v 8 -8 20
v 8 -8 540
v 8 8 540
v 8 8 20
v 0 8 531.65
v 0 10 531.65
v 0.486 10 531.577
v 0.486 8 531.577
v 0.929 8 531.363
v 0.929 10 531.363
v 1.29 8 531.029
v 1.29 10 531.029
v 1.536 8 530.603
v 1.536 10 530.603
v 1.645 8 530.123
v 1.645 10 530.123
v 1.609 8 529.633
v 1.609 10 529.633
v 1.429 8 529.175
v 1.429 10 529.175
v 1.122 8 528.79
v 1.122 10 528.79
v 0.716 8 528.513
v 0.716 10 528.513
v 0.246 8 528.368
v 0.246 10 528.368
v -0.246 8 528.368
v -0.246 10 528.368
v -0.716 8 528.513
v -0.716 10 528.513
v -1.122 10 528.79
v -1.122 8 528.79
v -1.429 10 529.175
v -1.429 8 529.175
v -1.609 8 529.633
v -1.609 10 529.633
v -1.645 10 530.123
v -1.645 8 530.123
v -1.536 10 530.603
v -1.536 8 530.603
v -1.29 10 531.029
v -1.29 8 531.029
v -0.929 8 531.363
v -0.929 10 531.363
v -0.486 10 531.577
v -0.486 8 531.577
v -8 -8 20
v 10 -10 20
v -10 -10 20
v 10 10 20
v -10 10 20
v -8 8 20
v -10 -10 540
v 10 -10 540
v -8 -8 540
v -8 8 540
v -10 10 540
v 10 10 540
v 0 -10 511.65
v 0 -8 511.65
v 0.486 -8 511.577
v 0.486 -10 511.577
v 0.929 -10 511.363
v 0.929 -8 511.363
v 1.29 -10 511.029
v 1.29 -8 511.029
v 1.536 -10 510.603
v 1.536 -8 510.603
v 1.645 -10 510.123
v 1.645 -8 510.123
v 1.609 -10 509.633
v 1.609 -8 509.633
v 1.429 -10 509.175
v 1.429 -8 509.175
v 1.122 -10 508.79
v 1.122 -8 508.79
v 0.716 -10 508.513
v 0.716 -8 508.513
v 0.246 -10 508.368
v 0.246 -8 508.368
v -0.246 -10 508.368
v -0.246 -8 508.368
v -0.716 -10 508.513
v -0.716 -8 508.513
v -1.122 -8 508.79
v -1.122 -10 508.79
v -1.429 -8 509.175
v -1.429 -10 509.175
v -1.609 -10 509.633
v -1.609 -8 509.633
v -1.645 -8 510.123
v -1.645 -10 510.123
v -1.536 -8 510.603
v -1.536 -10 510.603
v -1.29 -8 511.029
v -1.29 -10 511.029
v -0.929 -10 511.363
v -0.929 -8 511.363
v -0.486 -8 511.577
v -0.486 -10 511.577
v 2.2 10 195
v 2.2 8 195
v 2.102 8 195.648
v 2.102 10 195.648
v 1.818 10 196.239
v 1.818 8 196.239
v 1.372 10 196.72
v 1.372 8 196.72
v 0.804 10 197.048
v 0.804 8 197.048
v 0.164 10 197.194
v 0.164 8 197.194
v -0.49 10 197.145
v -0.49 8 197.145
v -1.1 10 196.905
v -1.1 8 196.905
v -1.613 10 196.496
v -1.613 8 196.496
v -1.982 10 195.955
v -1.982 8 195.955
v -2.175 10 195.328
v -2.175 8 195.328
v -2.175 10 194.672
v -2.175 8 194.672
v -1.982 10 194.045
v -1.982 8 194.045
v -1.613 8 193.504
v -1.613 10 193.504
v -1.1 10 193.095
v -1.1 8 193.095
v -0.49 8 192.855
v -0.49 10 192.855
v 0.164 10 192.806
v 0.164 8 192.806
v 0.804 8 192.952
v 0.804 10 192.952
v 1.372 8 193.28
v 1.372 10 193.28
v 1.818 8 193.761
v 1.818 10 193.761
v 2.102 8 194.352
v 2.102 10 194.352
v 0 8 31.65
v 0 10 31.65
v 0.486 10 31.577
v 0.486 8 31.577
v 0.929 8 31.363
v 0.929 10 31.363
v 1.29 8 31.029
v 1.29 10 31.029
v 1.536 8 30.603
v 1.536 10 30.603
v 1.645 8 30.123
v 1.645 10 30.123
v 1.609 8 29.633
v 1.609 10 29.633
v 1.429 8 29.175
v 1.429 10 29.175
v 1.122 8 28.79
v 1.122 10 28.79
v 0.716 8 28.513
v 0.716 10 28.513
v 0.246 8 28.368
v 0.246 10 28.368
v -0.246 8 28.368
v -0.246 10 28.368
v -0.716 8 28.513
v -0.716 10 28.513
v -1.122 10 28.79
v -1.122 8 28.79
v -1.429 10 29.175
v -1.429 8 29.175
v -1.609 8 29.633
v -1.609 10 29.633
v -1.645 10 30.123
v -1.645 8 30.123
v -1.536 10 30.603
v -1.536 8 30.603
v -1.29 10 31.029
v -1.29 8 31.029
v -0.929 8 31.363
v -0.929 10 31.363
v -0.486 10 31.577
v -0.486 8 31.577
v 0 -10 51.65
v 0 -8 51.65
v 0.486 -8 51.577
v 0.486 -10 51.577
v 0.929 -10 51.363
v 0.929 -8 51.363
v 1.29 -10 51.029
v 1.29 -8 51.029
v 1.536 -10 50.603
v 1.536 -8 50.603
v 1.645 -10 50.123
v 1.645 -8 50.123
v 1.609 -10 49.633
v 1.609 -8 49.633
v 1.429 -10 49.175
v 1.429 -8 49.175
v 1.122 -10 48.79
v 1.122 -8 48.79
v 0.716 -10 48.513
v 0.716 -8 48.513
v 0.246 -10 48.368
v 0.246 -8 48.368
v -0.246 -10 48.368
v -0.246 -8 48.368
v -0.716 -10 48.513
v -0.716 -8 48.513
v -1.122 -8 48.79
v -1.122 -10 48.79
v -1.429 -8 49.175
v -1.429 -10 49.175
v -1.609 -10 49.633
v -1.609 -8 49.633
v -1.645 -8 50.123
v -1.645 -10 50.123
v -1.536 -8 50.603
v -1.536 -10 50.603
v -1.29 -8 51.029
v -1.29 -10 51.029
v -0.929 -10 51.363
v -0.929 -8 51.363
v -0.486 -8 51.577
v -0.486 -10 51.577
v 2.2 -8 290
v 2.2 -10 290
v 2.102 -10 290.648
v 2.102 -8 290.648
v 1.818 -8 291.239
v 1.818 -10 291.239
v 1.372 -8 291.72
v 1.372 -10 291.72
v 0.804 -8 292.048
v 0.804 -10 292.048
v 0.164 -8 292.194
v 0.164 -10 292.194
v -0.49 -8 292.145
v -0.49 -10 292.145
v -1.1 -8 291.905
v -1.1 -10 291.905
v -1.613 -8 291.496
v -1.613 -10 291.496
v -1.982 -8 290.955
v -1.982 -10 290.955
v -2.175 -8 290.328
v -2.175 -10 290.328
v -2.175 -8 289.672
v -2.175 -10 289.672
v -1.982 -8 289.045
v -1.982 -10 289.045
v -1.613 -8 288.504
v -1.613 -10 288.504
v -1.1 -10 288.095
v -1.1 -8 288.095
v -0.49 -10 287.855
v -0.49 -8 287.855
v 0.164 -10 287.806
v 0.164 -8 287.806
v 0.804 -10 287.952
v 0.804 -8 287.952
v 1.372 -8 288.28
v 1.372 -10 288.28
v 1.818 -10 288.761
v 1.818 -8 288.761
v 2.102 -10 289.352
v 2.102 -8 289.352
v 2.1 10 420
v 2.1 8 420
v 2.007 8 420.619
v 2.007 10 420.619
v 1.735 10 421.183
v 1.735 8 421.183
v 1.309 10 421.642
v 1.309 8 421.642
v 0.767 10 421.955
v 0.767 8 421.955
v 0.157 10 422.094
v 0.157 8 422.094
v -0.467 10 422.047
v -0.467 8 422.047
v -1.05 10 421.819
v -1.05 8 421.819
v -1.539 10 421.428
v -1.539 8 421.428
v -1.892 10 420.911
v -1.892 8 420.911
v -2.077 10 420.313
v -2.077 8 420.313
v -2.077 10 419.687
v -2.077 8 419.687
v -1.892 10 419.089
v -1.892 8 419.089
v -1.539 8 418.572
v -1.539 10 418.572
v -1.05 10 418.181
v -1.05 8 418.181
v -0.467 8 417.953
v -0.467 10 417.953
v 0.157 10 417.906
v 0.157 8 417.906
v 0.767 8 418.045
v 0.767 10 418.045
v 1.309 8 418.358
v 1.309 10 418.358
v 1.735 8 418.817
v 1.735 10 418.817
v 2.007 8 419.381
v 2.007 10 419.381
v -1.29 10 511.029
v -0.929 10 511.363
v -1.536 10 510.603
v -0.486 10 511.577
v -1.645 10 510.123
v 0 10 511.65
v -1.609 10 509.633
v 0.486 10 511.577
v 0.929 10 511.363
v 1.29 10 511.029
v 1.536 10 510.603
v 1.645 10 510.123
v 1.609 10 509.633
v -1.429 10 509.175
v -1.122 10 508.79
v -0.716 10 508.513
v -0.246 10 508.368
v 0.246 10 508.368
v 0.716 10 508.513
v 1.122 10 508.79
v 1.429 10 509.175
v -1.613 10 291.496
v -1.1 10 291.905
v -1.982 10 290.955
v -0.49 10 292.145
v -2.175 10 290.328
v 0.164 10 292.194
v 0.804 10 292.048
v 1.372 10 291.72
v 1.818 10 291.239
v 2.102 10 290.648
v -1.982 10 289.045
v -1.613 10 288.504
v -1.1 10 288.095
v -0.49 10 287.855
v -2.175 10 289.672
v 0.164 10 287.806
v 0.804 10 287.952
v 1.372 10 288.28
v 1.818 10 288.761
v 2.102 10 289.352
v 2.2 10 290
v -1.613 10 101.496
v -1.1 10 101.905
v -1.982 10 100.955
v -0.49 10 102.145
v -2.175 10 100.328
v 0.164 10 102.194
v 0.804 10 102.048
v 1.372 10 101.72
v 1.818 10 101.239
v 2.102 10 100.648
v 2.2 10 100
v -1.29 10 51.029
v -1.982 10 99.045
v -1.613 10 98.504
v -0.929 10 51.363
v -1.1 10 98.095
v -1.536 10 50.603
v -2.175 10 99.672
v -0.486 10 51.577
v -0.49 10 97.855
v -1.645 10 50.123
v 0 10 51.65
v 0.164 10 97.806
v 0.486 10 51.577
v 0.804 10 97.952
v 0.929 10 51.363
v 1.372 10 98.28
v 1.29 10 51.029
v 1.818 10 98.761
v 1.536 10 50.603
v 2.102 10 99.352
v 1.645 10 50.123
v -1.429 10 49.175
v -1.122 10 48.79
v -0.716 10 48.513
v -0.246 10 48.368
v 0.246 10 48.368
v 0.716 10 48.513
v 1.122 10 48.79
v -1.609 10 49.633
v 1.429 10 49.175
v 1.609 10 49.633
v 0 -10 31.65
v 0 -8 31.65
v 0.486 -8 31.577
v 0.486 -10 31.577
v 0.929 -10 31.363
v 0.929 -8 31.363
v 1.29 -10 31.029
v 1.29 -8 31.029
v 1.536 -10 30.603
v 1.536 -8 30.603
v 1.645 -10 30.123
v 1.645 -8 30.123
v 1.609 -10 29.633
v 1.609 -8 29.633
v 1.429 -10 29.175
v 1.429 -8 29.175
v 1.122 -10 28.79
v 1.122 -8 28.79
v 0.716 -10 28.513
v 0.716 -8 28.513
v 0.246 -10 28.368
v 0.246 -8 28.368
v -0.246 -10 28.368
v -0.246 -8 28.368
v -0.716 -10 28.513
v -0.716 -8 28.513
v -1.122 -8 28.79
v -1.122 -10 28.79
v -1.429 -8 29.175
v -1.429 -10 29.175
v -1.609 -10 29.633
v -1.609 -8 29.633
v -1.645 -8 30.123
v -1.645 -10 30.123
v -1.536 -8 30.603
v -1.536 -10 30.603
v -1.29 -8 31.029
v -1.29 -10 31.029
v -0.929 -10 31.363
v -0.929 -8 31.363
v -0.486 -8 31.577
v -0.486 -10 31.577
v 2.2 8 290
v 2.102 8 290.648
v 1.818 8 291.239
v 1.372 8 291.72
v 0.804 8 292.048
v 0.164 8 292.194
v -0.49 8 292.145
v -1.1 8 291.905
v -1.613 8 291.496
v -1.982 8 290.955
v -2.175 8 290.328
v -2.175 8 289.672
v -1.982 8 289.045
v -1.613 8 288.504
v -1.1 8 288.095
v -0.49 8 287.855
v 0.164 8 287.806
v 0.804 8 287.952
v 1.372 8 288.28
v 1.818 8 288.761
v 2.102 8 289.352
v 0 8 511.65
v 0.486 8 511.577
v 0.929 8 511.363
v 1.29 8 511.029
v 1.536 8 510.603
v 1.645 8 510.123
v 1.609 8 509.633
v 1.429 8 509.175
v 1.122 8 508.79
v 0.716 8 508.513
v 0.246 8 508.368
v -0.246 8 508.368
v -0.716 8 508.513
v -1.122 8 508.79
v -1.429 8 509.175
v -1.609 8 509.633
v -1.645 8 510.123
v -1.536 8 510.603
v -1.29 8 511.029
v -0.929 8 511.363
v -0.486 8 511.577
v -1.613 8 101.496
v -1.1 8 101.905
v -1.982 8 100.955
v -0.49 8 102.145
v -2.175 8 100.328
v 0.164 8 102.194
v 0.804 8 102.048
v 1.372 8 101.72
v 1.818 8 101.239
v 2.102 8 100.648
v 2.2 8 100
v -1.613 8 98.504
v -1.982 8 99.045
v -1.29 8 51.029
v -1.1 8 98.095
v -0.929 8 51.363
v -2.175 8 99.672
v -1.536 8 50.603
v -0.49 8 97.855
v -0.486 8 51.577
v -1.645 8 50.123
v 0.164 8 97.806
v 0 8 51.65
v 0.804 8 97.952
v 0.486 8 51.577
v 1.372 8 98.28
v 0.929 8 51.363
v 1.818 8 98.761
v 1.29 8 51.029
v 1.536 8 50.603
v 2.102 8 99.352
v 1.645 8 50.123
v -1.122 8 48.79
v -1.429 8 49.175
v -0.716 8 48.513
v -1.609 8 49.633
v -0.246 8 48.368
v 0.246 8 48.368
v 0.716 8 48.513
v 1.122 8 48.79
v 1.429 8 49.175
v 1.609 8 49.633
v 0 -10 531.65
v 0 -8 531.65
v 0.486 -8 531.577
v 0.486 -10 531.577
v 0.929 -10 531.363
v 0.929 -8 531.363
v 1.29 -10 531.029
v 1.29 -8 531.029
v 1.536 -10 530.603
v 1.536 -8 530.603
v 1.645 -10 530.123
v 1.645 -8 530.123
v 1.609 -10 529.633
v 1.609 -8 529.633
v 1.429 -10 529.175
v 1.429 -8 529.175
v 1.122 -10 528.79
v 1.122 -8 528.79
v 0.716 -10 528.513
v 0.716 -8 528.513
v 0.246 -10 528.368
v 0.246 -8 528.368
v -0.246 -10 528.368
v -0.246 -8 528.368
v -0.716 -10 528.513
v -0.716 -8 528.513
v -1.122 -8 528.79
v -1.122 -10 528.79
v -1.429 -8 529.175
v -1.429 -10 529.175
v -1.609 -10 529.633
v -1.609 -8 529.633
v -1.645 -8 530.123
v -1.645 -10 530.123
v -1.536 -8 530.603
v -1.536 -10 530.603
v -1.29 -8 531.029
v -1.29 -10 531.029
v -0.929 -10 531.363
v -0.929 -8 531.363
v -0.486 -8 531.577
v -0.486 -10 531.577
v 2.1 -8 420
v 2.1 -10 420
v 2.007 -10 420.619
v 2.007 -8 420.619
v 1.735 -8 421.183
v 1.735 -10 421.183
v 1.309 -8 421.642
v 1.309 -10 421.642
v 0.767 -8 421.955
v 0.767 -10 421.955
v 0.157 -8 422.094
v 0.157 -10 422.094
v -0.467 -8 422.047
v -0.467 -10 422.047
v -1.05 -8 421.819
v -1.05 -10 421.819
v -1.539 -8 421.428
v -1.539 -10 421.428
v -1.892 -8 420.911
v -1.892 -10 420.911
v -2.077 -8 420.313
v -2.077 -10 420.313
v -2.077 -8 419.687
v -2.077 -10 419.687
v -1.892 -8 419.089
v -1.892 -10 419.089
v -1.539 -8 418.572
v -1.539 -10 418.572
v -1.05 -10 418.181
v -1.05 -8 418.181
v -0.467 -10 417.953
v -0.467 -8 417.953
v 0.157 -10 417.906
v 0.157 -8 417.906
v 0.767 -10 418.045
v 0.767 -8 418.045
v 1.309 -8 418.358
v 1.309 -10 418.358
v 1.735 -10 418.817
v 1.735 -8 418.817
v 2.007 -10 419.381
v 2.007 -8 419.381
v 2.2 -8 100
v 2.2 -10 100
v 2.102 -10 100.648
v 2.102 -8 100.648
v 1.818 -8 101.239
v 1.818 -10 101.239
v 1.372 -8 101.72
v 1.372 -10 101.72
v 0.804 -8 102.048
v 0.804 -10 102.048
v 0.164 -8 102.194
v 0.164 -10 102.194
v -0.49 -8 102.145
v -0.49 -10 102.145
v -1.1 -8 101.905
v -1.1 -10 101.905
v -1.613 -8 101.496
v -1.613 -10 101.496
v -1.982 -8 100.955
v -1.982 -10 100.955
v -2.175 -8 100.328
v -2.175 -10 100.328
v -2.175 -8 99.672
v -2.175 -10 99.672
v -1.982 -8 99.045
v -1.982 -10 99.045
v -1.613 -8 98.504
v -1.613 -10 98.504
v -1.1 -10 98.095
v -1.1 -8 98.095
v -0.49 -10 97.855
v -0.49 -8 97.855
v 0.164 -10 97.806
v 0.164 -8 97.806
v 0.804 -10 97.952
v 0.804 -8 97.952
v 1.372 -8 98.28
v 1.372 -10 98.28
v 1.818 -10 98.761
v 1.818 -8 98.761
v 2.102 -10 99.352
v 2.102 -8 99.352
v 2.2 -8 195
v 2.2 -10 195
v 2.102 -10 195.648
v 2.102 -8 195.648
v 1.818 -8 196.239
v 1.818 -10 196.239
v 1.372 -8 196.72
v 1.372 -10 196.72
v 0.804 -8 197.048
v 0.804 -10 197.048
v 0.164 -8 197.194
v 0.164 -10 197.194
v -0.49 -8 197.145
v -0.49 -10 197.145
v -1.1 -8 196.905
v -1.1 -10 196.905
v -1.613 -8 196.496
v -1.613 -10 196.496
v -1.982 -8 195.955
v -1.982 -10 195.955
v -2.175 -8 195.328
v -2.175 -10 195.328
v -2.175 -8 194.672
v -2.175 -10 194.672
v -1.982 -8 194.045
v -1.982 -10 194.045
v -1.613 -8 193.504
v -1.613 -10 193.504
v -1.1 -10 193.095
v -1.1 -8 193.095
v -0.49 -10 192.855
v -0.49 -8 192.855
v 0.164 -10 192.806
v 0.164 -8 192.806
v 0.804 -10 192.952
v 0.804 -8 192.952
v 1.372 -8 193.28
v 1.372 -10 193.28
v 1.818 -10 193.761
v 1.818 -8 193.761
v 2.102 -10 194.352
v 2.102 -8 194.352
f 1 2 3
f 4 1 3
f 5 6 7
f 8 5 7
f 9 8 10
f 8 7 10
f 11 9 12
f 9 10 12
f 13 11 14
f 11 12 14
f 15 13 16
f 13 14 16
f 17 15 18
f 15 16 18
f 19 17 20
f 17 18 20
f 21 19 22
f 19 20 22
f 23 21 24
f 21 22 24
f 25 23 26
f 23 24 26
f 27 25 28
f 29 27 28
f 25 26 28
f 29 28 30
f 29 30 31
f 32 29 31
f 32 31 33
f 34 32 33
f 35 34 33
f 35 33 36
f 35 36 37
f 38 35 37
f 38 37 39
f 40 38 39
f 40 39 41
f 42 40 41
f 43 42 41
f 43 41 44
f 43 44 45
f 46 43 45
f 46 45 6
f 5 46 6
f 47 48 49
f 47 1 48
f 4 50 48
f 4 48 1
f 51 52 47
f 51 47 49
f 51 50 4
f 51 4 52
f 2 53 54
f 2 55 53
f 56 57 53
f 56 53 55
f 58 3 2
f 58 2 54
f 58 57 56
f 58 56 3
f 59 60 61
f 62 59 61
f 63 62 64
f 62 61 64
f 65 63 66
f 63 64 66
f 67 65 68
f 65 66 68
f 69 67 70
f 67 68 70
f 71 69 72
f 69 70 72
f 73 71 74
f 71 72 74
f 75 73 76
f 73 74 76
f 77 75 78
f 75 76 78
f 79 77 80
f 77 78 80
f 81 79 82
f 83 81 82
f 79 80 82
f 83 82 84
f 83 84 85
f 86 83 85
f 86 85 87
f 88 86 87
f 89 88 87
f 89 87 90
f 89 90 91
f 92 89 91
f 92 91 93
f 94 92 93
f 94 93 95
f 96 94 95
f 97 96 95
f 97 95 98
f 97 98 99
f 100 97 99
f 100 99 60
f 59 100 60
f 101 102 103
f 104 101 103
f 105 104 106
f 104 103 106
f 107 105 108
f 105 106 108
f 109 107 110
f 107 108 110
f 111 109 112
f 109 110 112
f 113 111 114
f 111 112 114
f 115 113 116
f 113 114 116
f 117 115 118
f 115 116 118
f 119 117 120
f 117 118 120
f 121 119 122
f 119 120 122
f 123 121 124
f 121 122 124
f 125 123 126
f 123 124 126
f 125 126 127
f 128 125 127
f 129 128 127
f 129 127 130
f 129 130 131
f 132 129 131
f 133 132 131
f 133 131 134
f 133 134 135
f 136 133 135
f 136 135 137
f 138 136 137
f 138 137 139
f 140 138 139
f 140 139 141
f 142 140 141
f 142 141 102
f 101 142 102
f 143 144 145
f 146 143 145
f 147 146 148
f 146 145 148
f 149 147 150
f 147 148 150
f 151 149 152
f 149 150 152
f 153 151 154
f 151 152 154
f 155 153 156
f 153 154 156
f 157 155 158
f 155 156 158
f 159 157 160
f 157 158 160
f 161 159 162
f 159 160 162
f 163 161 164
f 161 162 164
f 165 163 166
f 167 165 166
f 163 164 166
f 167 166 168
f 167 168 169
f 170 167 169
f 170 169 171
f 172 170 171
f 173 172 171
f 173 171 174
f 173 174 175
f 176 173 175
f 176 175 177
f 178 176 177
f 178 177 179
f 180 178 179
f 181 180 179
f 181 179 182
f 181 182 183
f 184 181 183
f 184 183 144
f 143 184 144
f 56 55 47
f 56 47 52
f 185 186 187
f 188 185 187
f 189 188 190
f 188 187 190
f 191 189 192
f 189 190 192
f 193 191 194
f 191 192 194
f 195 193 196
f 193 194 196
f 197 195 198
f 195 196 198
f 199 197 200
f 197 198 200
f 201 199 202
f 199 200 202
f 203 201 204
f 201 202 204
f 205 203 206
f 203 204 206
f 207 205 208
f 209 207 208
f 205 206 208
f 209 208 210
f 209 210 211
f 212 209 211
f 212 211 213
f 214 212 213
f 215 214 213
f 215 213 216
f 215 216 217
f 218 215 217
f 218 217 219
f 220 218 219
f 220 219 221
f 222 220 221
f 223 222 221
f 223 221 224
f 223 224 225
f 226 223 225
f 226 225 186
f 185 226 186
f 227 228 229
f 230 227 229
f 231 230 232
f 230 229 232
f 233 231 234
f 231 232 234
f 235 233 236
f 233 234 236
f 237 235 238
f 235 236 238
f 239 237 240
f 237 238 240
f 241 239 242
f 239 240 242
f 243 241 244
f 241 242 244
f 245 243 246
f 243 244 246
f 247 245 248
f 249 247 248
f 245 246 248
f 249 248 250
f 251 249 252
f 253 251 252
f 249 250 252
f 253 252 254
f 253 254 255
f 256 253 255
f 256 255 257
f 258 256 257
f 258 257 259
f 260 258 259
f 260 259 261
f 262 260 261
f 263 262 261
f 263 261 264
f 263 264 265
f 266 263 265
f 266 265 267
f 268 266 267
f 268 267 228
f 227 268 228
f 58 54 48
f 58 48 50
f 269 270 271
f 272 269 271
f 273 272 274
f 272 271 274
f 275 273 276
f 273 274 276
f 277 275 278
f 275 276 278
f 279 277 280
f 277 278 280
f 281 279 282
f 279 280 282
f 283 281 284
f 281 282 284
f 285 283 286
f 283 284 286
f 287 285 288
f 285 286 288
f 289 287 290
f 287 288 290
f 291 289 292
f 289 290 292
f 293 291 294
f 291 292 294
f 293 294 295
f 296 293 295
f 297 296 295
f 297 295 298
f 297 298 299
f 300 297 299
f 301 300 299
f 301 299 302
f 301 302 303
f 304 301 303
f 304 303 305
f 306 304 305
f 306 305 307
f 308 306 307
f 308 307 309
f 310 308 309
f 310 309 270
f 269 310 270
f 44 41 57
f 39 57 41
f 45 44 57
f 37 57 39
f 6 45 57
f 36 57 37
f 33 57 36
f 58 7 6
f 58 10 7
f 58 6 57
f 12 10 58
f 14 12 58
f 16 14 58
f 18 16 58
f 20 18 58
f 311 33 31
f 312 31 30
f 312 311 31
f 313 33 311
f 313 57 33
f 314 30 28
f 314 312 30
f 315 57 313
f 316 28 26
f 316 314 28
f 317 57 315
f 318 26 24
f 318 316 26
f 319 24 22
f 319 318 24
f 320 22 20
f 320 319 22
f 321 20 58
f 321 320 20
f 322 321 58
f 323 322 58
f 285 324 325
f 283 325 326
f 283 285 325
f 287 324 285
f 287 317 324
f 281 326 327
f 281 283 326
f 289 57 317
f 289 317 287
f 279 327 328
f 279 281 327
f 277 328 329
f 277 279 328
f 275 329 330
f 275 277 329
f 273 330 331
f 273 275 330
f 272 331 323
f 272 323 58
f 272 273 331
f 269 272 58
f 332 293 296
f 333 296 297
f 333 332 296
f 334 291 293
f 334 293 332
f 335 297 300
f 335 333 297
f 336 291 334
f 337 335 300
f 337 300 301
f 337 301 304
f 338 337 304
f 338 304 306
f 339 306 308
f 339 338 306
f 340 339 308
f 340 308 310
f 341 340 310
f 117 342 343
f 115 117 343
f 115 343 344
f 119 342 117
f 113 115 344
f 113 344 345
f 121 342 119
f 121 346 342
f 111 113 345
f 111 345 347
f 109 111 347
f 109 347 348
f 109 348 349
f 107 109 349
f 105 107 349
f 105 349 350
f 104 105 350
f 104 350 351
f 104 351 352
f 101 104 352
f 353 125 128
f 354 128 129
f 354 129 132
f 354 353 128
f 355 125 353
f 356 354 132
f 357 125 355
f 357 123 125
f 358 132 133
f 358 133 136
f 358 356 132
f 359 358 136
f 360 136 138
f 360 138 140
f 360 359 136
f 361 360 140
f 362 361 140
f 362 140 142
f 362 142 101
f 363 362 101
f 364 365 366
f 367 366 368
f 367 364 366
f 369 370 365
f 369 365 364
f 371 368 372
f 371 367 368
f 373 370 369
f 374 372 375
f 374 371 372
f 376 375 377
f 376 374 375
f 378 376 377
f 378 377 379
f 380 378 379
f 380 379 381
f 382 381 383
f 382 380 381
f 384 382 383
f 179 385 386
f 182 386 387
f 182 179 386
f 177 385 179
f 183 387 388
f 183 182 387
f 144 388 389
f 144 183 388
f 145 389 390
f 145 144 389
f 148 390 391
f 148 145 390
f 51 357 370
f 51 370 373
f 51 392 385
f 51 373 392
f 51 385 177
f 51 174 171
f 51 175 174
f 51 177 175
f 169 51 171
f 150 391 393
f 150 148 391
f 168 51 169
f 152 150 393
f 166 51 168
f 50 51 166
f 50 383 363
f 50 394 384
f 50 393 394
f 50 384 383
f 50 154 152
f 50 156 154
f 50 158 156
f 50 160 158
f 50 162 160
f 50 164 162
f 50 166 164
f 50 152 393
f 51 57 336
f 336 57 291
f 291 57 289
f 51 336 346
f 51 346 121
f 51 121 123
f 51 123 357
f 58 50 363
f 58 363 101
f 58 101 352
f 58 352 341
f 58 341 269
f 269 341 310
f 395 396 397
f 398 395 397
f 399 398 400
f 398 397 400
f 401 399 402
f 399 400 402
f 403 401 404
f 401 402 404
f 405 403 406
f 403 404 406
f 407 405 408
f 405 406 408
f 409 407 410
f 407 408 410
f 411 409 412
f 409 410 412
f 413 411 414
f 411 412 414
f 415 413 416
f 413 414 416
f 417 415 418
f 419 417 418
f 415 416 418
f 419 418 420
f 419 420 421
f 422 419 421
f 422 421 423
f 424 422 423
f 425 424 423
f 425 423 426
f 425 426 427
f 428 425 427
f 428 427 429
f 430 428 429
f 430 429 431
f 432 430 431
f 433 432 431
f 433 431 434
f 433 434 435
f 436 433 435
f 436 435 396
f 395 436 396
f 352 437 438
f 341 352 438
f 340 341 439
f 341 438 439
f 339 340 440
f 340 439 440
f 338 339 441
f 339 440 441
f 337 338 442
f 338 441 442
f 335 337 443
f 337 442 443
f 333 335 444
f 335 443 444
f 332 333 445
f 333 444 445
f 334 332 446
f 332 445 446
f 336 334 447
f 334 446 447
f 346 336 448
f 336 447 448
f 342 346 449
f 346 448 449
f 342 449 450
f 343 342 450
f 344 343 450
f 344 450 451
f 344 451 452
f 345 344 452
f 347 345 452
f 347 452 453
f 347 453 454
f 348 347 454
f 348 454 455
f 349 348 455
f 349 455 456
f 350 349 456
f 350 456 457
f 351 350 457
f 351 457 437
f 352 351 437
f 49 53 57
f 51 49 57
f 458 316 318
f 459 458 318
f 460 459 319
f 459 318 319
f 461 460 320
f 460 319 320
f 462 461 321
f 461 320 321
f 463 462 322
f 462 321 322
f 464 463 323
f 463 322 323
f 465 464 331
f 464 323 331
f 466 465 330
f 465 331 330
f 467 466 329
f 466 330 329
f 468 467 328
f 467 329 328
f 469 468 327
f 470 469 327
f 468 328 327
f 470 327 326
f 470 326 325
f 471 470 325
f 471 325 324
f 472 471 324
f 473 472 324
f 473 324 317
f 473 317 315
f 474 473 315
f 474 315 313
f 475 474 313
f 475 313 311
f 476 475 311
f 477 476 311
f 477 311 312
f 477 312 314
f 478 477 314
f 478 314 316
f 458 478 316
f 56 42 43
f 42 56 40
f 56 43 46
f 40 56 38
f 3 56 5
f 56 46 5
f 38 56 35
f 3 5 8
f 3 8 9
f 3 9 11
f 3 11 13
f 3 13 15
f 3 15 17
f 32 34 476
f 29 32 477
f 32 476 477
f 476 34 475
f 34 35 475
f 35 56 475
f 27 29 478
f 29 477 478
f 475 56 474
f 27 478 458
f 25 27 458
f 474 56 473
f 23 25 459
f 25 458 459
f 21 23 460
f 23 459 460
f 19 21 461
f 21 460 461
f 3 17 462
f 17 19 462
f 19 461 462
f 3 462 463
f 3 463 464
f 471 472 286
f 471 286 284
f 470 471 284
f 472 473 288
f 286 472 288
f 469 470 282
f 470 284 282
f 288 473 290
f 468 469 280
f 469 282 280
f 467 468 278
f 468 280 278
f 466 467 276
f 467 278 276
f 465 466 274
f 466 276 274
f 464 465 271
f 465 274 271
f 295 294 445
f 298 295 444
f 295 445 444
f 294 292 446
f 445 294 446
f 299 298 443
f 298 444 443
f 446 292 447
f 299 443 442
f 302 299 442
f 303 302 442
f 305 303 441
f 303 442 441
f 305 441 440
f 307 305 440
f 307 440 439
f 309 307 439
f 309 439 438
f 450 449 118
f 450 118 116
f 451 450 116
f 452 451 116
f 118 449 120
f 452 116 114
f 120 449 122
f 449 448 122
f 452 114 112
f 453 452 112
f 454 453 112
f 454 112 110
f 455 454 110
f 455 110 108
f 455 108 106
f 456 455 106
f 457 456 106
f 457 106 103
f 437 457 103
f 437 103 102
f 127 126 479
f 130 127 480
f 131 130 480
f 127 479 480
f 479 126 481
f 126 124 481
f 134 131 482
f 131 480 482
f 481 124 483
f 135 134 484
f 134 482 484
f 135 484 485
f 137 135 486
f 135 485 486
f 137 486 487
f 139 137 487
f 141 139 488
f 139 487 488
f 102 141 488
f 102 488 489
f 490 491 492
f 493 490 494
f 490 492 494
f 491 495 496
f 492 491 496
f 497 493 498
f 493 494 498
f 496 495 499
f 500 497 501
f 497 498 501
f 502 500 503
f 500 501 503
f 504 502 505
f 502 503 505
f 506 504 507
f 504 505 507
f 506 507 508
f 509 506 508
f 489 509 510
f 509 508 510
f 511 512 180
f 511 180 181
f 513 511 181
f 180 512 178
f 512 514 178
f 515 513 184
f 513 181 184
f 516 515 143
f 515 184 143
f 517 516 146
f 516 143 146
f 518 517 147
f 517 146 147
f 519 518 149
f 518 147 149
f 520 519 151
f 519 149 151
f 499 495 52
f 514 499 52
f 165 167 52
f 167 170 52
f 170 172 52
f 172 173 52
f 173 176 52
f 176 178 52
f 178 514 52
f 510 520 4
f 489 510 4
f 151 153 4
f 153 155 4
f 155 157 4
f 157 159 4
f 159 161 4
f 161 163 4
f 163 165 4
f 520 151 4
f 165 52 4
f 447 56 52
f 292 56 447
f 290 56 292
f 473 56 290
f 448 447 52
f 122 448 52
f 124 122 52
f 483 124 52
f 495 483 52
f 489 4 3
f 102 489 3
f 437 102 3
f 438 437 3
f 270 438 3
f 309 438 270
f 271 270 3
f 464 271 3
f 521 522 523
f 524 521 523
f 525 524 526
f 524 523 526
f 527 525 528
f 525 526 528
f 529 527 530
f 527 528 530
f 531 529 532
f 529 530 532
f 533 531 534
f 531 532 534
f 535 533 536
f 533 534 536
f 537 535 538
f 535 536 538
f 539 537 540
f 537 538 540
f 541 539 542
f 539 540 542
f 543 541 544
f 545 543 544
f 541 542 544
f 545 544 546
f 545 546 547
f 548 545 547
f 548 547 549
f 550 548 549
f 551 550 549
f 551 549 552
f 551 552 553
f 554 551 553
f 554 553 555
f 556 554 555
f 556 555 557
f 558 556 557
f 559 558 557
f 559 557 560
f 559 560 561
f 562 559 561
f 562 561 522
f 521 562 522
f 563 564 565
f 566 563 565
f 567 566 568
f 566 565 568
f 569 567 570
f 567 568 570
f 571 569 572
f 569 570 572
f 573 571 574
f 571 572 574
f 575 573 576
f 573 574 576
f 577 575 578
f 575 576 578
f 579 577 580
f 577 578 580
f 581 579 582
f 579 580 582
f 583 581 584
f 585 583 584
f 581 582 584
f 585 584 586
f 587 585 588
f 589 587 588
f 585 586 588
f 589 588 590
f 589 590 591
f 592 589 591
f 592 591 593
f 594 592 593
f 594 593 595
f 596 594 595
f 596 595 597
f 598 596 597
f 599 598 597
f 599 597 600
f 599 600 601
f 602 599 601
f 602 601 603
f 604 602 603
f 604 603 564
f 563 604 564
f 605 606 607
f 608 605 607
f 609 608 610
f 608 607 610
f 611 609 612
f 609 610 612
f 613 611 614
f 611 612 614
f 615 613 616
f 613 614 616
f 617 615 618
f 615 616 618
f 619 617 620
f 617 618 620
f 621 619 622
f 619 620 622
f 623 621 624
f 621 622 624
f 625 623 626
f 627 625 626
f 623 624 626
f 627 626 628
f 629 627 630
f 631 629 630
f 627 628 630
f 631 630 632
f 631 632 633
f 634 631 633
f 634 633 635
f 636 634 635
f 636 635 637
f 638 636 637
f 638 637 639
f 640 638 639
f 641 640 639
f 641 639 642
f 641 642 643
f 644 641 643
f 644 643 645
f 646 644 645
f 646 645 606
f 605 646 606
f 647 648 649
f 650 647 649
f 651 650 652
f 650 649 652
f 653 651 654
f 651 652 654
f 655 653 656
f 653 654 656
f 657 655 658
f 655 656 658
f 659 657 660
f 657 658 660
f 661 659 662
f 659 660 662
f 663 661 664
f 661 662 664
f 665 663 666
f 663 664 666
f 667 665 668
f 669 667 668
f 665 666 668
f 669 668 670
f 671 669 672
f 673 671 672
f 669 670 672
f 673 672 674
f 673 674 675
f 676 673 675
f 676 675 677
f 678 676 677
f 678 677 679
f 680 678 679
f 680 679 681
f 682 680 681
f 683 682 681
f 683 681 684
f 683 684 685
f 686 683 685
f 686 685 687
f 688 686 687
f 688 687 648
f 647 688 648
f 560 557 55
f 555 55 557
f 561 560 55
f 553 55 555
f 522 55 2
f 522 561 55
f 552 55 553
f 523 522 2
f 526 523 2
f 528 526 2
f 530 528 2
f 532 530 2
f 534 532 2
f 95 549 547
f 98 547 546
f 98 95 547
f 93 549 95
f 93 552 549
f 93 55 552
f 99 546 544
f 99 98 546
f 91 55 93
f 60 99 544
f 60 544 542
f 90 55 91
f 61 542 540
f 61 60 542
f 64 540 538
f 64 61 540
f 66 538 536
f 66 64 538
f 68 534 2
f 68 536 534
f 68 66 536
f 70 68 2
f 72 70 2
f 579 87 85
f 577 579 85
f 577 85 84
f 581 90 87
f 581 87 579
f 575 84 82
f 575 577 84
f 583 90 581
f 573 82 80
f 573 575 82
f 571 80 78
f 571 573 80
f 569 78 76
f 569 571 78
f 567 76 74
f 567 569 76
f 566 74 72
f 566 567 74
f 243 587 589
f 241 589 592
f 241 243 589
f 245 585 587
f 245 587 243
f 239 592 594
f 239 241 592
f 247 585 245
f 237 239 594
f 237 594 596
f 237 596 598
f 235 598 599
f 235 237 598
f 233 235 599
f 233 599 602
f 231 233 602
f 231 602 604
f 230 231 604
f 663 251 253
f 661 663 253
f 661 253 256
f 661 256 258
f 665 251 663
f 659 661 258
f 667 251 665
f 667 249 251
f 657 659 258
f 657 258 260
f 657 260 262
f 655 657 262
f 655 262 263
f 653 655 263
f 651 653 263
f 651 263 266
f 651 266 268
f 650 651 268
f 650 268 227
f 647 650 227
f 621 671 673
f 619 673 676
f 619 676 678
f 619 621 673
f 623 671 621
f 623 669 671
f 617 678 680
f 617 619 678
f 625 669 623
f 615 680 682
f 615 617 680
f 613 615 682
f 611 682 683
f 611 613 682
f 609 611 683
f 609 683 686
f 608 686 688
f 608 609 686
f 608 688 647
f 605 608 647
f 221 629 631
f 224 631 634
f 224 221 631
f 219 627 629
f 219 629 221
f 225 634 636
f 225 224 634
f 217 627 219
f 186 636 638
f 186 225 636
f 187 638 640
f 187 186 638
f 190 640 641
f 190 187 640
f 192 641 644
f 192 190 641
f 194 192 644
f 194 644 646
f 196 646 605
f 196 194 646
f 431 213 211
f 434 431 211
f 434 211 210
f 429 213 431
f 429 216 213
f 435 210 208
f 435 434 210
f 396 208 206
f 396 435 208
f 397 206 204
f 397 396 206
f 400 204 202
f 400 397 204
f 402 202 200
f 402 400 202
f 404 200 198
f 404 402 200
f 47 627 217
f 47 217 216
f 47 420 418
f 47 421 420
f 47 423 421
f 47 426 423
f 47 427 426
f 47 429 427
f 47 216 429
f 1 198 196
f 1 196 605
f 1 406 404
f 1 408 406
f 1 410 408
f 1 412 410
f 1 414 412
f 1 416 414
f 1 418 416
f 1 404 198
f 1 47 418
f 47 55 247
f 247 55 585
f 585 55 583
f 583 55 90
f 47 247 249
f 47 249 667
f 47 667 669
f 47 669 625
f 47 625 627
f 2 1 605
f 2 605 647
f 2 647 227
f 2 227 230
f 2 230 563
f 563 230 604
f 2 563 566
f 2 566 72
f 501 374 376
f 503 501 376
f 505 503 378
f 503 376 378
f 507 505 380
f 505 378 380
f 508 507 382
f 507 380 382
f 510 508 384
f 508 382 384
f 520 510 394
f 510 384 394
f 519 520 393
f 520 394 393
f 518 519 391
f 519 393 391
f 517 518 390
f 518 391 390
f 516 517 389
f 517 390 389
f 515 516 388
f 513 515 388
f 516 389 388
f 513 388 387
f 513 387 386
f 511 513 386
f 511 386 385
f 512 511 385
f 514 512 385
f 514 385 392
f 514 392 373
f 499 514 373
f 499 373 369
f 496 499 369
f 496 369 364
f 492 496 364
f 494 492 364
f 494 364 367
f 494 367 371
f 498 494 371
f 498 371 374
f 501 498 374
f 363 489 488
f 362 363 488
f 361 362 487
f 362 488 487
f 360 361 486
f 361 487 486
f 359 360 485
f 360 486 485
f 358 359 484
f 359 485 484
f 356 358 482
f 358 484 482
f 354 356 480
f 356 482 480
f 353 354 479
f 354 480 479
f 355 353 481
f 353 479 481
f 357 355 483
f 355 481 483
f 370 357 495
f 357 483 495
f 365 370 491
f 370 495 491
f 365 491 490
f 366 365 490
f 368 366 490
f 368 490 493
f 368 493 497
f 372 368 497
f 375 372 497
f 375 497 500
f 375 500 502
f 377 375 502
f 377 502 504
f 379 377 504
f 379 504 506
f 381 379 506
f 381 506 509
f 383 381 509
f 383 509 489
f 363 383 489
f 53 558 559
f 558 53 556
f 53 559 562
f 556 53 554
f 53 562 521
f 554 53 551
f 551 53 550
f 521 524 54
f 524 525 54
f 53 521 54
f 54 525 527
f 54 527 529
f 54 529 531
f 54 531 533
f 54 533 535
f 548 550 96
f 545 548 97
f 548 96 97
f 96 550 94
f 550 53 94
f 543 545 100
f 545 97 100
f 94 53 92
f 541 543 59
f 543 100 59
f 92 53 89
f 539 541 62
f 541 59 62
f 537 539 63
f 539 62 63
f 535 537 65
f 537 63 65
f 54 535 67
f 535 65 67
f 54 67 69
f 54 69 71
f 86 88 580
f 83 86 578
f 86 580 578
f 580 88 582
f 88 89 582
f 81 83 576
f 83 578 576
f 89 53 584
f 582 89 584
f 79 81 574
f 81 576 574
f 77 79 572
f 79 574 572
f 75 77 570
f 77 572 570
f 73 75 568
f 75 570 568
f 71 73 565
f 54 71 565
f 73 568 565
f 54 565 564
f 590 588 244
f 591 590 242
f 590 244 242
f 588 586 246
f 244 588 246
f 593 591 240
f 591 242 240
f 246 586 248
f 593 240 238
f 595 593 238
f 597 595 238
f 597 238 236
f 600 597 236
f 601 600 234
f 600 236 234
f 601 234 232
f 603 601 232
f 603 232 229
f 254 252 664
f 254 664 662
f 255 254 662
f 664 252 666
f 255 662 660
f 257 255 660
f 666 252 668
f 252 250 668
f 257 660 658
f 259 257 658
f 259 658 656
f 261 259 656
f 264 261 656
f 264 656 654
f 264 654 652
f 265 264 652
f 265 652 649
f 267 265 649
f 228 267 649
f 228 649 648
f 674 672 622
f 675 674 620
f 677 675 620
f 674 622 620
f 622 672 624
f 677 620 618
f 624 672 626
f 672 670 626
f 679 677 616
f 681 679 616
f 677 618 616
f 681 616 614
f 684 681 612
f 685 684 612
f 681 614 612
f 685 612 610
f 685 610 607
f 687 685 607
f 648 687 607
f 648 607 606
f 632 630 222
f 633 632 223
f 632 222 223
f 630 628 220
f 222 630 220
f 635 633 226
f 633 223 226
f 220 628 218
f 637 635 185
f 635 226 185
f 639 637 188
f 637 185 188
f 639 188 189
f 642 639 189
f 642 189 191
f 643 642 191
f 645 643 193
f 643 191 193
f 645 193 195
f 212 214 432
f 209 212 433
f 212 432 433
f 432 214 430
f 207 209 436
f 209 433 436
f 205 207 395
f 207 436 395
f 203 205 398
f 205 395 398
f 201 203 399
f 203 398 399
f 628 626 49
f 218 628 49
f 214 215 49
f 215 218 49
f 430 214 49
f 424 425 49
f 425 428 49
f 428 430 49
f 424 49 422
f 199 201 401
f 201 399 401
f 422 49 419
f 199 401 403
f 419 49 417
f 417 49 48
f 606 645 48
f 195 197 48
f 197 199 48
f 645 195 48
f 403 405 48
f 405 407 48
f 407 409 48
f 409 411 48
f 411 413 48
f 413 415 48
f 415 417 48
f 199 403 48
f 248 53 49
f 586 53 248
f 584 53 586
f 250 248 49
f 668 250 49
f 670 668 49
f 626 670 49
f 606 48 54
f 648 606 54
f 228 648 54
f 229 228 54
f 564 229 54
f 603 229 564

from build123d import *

# Parameters (mm, degrees)
SKETCH_1_W           = 20
SKETCH_1_H           = 20
SKETCH_1_W_2         = 16
SKETCH_1_H_2         = 16
EXTRUDE_1_DEPTH      = 560
SKETCH_4_R           = 2.2
CUT_EXTRUDE_3_DEPTH  = 560
SKETCH_5_W           = 20
SKETCH_5_H           = 20
SKETCH_5_W_2         = 16
SKETCH_5_H_2         = 16
EXTRUDE_2_DEPTH      = 20
SKETCH_6_W           = 20
SKETCH_6_H           = 20
SKETCH_6_W_2         = 16
SKETCH_6_H_2         = 16
EXTRUDE_3_DEPTH      = 20
SKETCH_8_R           = 2.2
CUT_EXTRUDE_4_DEPTH  = 20
SKETCH_9_R           = 2.2
CUT_EXTRUDE_5_DEPTH  = 20
SKETCH_10_W          = 51.42245882
SKETCH_10_H          = 30.440795882
CUT_EXTRUDE_6_DEPTH  = 40
SKETCH_11_W          = 39.362638682
SKETCH_11_H          = 52.74733359
CUT_EXTRUDE_7_DEPTH  = 40
SKETCH_12_R          = 1
CUT_EXTRUDE_8_DEPTH  = 20
SKETCH_13_R          = 1
CUT_EXTRUDE_9_DEPTH  = 20
SKETCH_15_R          = 2.2
CUT_EXTRUDE_11_DEPTH = 21
SKETCH_16_R          = 2.1
CUT_EXTRUDE_12_DEPTH = 21
M4X0_7_4_D           = 3.3
M4X0_7_5_D           = 3.3


with BuildPart() as part:
    # ｽｹｯﾁ1 → ﾎﾞｽ - 押し出し1 (new body)
    with BuildSketch(Plane.XY):
        Rectangle(SKETCH_1_W, SKETCH_1_H)
        Rectangle(SKETCH_1_W_2, SKETCH_1_H_2, mode=Mode.SUBTRACT)
    extrude(amount=EXTRUDE_1_DEPTH)

    # ｽｹｯﾁ4 → ｶｯﾄ - 押し出し3 (cut)
    with BuildSketch(Plane(origin=(0, 10, 0), x_dir=(1, 0, 0), z_dir=(0, 1, 0))):
        with Locations((0, -550)):
            Circle(SKETCH_4_R)
        with Locations((0, -10)):
            Circle(SKETCH_4_R)
    extrude(amount=-CUT_EXTRUDE_3_DEPTH, mode=Mode.SUBTRACT)

    # ｽｹｯﾁ5 → ﾎﾞｽ - 押し出し2 (add)
    with BuildSketch(Plane(origin=(0, 0, 0), x_dir=(-1, 0, 0), z_dir=(0, 0, -1))):
        Rectangle(SKETCH_5_W, SKETCH_5_H)
        Rectangle(SKETCH_5_W_2, SKETCH_5_H_2, mode=Mode.SUBTRACT)
    extrude(amount=EXTRUDE_2_DEPTH)

    # ｽｹｯﾁ6 → ﾎﾞｽ - 押し出し3 (add)
    with BuildSketch(Plane.XY.offset(560)):
        Rectangle(SKETCH_6_W, SKETCH_6_H)
        Rectangle(SKETCH_6_W_2, SKETCH_6_H_2, mode=Mode.SUBTRACT)
    extrude(amount=EXTRUDE_3_DEPTH)

    # ｽｹｯﾁ8 → ｶｯﾄ - 押し出し4 (cut)
    with BuildSketch(Plane(origin=(10, 0, 0), x_dir=(0, 0, -1), z_dir=(1, 0, 0))):
        with Locations((-570, 0)):
            Circle(SKETCH_8_R)
    extrude(amount=-CUT_EXTRUDE_4_DEPTH, mode=Mode.SUBTRACT)

    # ｽｹｯﾁ9 → ｶｯﾄ - 押し出し5 (cut)
    with BuildSketch(Plane(origin=(10, 0, 0), x_dir=(0, 0, -1), z_dir=(1, 0, 0))):
        with Locations((10, 0)):
            Circle(SKETCH_9_R)
    extrude(amount=-CUT_EXTRUDE_5_DEPTH, mode=Mode.SUBTRACT)

    # ｽｹｯﾁ10 → ｶｯﾄ - 押し出し6 (cut)
    with BuildSketch(Plane(origin=(0, 0, -20), x_dir=(-1, 0, 0), z_dir=(0, 0, -1))):
        Rectangle(SKETCH_10_W, SKETCH_10_H)
    extrude(amount=-CUT_EXTRUDE_6_DEPTH, mode=Mode.SUBTRACT)

    # ｽｹｯﾁ11 → ｶｯﾄ - 押し出し7 (cut)
    with BuildSketch(Plane.XY.offset(580)):
        Rectangle(SKETCH_11_W, SKETCH_11_H)
    extrude(amount=-CUT_EXTRUDE_7_DEPTH, mode=Mode.SUBTRACT)

    # ｽｹｯﾁ12 → ｶｯﾄ - 押し出し8 (cut)
    with BuildSketch(Plane(origin=(0, -10, 0), x_dir=(-1, 0, 0), z_dir=(0, -1, 0))):
        with Locations((0, -530)):
            Circle(SKETCH_12_R)
        with Locations((0, -510)):
            Circle(SKETCH_12_R)
    extrude(amount=-CUT_EXTRUDE_8_DEPTH, mode=Mode.SUBTRACT)

    # ｽｹｯﾁ13 → ｶｯﾄ - 押し出し9 (cut)
    with BuildSketch(Plane(origin=(0, -10, 0), x_dir=(-1, 0, 0), z_dir=(0, -1, 0))):
        with Locations((0, -30)):
            Circle(SKETCH_13_R)
        with Locations((0, -50)):
            Circle(SKETCH_13_R)
    extrude(amount=-CUT_EXTRUDE_9_DEPTH, mode=Mode.SUBTRACT)

    # ｽｹｯﾁ15 → ｶｯﾄ - 押し出し11 (cut, through all)
    with BuildSketch(Plane.XZ.offset(10)):
        with Locations((0, 100)):
            Circle(SKETCH_15_R)
        with Locations((0, 195)):
            Circle(SKETCH_15_R)
        with Locations((0, 290)):
            Circle(SKETCH_15_R)
    extrude(amount=-CUT_EXTRUDE_11_DEPTH, mode=Mode.SUBTRACT)

    # ｽｹｯﾁ16 → ｶｯﾄ - 押し出し12 (cut, through all)
    with BuildSketch(Plane.XZ.offset(10)):
        with Locations((0, 420)):
            Circle(SKETCH_16_R)
    extrude(amount=-CUT_EXTRUDE_12_DEPTH, mode=Mode.SUBTRACT)

    # M4x0.7 ねじ穴4 (through all)
    with Locations(Plane(origin=(0, -10, 30), x_dir=(0, 0, -1), z_dir=(0, -1, 0))):
        with Locations((0, 0), (-20, 0)):
            Hole(M4X0_7_4_D / 2)

    # M4x0.7 ねじ穴5 (through all)
    with Locations(Plane(origin=(0, -10, 530), x_dir=(0, 0, -1), z_dir=(0, -1, 0))):
        with Locations((0, 0), (20, 0)):
            Hole(M4X0_7_5_D / 2)


solid = part.part
